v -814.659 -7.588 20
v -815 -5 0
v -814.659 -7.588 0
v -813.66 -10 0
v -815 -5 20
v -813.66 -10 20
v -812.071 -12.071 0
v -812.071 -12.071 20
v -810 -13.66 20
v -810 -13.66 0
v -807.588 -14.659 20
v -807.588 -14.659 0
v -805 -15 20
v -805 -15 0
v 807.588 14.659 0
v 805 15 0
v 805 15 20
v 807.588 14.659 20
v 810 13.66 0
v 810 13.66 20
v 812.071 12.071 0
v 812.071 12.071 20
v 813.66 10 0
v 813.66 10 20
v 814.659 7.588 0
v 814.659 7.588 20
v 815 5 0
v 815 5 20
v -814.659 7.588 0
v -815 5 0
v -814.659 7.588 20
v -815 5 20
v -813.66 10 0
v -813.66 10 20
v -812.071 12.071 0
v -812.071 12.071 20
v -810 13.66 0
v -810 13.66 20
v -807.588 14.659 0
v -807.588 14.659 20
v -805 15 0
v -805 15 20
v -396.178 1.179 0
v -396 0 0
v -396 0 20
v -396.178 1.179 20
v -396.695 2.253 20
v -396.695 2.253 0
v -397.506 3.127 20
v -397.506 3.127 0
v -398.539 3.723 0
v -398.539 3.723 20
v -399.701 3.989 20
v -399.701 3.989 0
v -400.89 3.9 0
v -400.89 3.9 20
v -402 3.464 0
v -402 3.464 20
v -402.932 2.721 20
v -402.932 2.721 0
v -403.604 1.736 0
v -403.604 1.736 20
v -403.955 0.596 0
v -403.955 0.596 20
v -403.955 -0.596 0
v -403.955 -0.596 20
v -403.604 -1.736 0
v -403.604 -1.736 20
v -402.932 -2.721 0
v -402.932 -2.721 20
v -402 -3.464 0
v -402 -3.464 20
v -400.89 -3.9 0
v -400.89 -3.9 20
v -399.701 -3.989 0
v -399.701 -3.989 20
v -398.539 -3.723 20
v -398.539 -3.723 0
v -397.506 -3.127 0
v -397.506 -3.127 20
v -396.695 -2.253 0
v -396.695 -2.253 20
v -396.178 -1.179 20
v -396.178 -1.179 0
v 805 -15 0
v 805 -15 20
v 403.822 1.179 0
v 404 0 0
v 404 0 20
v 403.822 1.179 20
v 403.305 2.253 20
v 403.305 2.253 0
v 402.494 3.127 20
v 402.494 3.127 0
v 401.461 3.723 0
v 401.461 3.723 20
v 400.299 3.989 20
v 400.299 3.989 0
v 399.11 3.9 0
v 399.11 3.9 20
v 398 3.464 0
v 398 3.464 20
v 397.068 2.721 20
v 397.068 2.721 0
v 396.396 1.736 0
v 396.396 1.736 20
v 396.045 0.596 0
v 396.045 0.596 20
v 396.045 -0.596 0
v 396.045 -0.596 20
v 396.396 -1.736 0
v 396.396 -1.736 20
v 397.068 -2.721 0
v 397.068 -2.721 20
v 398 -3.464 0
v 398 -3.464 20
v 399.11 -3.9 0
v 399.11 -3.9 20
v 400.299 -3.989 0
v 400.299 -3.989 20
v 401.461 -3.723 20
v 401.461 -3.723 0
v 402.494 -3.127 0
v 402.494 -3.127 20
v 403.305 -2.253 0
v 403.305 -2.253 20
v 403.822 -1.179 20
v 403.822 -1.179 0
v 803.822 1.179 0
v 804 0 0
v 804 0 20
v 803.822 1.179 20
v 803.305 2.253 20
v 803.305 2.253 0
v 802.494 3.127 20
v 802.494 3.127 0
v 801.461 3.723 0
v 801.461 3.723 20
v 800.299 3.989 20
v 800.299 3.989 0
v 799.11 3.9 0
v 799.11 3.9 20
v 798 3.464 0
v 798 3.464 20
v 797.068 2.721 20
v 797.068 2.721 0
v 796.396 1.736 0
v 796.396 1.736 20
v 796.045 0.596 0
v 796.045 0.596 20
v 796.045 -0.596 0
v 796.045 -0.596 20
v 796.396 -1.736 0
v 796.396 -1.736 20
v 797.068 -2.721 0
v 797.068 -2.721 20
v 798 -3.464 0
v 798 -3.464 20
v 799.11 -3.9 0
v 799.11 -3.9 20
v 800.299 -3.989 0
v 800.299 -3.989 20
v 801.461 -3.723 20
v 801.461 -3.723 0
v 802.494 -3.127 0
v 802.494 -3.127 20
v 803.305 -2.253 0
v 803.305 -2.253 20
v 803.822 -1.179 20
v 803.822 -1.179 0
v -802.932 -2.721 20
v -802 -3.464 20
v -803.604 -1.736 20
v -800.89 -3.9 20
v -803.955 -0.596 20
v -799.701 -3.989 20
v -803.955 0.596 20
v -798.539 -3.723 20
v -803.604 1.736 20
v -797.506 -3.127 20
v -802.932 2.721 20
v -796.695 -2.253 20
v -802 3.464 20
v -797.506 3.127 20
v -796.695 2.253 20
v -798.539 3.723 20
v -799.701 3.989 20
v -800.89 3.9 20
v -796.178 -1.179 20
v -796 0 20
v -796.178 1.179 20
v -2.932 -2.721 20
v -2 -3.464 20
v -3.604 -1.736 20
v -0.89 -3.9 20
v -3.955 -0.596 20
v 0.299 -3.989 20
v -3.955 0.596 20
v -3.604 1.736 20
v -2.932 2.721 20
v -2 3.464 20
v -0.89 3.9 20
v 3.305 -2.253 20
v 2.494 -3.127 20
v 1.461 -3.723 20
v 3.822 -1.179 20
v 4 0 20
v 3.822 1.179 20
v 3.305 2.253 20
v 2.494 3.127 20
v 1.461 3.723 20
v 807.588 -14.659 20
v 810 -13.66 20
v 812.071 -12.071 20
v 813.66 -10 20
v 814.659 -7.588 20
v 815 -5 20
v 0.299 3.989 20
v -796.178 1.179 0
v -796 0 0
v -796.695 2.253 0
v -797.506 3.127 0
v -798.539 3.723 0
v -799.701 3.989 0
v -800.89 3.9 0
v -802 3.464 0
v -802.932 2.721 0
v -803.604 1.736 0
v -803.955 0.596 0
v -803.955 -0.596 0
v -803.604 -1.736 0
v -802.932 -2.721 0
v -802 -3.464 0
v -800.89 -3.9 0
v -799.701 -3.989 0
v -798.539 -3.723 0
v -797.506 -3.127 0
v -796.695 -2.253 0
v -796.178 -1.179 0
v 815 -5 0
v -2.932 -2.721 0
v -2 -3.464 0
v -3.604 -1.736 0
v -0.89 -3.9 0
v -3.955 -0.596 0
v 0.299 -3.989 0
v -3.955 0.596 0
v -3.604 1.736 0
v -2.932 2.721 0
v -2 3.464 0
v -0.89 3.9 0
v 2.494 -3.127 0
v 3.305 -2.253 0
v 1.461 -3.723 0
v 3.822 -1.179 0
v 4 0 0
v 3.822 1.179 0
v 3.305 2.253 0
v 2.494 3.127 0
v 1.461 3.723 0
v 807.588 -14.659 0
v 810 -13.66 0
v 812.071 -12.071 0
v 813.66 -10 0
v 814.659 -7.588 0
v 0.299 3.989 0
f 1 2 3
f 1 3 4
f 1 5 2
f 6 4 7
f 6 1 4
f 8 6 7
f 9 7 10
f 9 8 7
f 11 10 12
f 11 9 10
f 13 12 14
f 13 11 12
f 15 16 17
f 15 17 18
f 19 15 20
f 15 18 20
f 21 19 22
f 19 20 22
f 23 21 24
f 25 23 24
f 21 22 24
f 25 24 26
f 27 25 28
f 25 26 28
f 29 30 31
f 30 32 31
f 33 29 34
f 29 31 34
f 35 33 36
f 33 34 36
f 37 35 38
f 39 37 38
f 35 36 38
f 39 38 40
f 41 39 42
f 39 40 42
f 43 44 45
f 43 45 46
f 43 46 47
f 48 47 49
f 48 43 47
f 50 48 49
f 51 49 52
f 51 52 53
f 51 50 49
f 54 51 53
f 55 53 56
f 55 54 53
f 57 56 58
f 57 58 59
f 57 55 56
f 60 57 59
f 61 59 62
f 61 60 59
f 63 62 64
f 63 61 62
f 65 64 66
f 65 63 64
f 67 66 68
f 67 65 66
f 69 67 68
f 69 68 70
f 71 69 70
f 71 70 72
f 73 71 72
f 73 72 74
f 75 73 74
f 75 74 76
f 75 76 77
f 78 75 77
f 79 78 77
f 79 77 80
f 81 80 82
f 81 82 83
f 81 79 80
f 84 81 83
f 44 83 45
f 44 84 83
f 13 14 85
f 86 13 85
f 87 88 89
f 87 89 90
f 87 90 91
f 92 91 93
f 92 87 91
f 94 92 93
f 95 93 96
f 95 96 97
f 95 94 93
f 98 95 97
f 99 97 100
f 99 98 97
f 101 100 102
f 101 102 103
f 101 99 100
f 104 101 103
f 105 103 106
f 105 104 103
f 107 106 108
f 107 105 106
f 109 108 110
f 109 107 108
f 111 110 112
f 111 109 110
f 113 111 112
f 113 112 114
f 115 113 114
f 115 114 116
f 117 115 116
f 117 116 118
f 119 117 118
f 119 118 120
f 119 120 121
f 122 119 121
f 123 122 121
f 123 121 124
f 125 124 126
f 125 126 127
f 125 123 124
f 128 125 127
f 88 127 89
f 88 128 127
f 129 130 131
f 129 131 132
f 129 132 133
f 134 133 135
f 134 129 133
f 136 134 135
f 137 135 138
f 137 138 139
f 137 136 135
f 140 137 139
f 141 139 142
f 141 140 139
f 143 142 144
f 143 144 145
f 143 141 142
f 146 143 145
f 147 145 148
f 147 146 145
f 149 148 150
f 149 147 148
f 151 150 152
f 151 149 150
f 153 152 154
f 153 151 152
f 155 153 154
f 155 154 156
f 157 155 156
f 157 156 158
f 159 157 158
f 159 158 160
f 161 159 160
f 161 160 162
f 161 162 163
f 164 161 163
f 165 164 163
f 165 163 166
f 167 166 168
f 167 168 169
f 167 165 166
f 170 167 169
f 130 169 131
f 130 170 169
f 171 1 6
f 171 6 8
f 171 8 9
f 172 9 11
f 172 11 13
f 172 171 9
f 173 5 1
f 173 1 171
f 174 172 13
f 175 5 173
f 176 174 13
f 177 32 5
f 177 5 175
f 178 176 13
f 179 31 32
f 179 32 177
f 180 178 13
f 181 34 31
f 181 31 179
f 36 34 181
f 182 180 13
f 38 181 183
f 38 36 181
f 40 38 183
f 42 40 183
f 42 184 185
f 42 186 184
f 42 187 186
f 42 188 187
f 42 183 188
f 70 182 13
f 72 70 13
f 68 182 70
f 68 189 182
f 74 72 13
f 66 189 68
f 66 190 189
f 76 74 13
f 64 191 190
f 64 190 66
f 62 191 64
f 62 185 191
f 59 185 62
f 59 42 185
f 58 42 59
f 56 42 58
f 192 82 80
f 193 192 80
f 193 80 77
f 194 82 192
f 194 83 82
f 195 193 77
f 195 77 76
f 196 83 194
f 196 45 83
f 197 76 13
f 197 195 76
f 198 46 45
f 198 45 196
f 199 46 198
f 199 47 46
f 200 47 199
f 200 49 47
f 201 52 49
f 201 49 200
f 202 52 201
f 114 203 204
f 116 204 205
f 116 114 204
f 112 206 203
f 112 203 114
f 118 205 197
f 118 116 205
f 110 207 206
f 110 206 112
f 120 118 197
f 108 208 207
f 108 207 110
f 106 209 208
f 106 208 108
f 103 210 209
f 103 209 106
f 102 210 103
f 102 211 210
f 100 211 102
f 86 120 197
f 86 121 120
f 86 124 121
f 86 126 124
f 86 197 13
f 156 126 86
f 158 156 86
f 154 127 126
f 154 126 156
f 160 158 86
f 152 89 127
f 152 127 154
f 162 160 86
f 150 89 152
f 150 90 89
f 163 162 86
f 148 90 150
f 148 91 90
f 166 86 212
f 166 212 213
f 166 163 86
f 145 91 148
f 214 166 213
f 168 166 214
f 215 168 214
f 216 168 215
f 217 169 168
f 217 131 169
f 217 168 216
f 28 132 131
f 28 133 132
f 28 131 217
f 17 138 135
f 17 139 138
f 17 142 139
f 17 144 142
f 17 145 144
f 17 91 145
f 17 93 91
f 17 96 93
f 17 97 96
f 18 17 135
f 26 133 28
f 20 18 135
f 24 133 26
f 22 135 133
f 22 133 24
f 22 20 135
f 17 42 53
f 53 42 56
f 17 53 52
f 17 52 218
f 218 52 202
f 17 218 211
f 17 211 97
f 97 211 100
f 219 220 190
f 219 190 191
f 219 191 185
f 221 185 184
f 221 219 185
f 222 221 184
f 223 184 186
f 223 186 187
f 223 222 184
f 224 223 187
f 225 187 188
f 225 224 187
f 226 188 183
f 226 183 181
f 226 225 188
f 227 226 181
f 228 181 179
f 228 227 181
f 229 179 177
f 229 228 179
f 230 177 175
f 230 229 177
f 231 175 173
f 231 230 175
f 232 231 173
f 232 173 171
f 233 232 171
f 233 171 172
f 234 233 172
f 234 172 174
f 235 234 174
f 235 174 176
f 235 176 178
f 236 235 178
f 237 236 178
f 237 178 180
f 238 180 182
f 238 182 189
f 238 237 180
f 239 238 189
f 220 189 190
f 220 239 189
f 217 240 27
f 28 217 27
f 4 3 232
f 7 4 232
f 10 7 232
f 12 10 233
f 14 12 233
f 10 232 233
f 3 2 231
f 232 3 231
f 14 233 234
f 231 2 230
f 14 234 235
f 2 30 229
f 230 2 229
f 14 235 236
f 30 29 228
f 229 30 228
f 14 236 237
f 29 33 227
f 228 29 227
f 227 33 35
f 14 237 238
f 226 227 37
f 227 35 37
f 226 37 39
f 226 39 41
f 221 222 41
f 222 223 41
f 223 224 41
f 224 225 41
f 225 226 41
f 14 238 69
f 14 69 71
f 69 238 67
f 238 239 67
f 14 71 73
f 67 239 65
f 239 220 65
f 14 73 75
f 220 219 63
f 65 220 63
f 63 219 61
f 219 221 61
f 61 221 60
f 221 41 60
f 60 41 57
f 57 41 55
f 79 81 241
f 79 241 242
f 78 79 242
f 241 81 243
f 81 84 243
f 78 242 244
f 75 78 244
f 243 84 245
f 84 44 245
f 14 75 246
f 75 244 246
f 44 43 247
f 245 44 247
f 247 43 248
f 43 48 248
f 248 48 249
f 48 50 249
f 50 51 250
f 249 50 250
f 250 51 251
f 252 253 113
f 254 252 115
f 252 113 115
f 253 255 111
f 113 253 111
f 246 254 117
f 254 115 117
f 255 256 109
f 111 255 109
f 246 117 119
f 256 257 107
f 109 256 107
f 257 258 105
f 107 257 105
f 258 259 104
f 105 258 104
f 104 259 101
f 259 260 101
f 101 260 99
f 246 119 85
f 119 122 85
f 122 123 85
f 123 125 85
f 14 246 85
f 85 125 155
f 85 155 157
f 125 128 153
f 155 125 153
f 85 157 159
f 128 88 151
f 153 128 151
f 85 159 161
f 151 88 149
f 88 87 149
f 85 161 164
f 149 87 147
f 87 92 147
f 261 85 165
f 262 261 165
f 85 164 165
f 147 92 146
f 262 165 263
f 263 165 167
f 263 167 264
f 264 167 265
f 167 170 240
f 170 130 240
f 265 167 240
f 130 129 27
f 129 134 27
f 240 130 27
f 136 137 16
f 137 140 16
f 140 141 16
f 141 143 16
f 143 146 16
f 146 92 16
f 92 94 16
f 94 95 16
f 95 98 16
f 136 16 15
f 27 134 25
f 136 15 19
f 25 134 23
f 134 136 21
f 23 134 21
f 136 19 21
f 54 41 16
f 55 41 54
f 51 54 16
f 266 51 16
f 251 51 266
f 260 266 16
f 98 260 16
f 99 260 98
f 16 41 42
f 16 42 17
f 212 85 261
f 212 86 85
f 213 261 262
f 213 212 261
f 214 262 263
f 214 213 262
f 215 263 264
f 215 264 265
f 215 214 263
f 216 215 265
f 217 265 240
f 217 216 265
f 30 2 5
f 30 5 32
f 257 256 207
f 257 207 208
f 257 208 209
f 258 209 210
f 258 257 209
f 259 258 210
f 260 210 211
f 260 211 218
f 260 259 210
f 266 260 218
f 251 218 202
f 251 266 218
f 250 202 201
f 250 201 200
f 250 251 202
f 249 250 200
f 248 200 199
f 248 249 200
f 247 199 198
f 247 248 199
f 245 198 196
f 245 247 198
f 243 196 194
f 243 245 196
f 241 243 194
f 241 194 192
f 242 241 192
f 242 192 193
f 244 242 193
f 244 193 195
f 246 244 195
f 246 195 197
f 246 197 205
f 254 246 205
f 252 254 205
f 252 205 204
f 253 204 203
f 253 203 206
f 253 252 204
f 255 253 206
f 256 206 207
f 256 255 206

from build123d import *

# Parameters (mm, degrees)
F0_W     = 1630
F0_H     = 30
F0_R     = 4
F1_DEPTH = 20
F2_R     = 10


with BuildPart() as f1:
    # F0 (on Top) → F1 (new body)
    with BuildSketch(Plane.XY):
        Rectangle(F0_W, F0_H)
        with Locations((-800, 0)):
            Circle(F0_R, mode=Mode.SUBTRACT)
        with Locations((-400, 0)):
            Circle(F0_R, mode=Mode.SUBTRACT)
        Circle(F0_R, mode=Mode.SUBTRACT)
        with Locations((400, 0)):
            Circle(F0_R, mode=Mode.SUBTRACT)
        with Locations((800, 0)):
            Circle(F0_R, mode=Mode.SUBTRACT)
    extrude(amount=F1_DEPTH)

    # F2
    f2_edges = [f1.edges().sort_by_distance(p)[0] for p in [
        (-815, 15, 10),
        (-815, -15, 10),
        (815, 15, 10),
        (815, -15, 10),
    ]]
    fillet(f2_edges, radius=F2_R)


solid = f1.part
